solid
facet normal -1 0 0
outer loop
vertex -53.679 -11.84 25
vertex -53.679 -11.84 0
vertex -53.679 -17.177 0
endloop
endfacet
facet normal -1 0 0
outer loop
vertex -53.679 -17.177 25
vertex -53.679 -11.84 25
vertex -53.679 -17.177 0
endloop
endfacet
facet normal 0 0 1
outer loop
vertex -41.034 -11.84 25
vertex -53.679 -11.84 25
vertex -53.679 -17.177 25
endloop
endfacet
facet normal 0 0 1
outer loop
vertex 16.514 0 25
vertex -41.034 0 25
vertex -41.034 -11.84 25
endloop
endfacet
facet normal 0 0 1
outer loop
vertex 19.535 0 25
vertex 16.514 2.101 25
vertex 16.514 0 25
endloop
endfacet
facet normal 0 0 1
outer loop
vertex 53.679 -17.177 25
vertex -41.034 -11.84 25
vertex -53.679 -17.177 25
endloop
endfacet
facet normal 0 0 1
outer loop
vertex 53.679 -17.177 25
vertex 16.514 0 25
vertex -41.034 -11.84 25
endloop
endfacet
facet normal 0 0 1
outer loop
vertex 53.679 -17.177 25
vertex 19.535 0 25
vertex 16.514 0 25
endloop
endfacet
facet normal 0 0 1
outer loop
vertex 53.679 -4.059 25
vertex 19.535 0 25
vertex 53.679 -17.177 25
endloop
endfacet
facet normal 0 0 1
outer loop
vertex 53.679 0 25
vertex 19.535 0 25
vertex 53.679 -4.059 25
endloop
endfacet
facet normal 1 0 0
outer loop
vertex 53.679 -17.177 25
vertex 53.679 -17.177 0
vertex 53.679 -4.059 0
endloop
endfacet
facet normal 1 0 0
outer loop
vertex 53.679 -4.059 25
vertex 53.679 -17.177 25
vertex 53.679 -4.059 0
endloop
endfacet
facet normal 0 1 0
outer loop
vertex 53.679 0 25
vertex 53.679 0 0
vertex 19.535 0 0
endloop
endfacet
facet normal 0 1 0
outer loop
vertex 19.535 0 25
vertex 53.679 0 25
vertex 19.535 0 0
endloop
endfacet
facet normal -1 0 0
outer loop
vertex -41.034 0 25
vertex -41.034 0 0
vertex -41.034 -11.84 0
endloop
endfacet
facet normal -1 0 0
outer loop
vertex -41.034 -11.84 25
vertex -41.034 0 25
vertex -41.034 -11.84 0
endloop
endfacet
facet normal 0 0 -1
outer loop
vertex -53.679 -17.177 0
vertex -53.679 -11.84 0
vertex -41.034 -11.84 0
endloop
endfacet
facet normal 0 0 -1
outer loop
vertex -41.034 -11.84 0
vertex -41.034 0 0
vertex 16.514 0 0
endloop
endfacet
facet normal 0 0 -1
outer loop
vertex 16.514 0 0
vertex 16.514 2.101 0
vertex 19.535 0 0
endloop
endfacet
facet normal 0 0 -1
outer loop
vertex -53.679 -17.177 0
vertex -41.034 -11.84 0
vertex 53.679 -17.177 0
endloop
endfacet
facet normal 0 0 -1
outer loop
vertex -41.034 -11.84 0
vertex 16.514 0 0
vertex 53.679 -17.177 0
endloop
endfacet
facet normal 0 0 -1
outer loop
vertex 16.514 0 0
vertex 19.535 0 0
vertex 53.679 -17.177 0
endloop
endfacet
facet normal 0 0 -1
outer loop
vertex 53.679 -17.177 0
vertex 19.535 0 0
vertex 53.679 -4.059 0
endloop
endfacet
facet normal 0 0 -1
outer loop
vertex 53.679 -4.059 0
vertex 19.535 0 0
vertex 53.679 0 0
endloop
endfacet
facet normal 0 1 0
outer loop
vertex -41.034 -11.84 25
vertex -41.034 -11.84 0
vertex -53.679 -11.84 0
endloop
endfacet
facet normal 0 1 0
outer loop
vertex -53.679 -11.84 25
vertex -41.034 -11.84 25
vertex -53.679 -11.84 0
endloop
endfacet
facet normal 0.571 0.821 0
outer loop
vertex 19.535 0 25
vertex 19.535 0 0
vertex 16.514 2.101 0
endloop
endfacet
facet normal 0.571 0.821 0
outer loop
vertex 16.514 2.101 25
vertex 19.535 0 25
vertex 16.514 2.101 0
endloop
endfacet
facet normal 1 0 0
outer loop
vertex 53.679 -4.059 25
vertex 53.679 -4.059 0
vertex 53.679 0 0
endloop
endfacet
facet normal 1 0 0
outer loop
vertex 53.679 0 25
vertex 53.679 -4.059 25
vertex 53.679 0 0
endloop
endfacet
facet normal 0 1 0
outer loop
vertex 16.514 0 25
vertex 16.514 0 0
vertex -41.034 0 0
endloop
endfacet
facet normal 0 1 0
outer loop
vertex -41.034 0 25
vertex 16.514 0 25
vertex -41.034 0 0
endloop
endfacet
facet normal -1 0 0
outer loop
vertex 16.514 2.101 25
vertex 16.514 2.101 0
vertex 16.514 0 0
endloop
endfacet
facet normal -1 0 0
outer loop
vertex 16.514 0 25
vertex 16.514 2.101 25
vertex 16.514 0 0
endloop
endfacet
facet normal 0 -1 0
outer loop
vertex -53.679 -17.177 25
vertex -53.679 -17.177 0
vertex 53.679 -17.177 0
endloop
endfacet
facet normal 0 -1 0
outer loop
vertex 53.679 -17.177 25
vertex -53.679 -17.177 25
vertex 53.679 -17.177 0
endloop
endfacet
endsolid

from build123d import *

# Parameters (mm, degrees)
F0_W     = 9.444609
F0_H     = 13.117496
F1_DEPTH = 25


with BuildPart() as f1:
    # F0 (on Top) → F1 (new body)
    with BuildSketch(Plane.XY):
        with Locations((48.95623, -10.61799)):
            Rectangle(F0_W, F0_H)
        Polygon((19.53455, 0), (44.233926, -17.176738), (44.233926, -4.059242), (53.678535, -4.059242), (49.502895, 0), align=None)
        Polygon((-53.678535, -17.176738), (44.233926, -17.176738), (19.53455, 0), (16.513675, 0), (11.002047, 0), (-24.868423, 0), (-41.03421, 0), (-41.03421, -11.840364), (-53.678535, -11.840364), align=None)
        Polygon((49.502895, 0), (53.678535, -4.059242), (53.678535, 0), align=None)
        Polygon((16.513675, 0), (19.53455, 0), (16.513675, 2.100813), align=None)
    extrude(amount=F1_DEPTH)


solid = f1.part
